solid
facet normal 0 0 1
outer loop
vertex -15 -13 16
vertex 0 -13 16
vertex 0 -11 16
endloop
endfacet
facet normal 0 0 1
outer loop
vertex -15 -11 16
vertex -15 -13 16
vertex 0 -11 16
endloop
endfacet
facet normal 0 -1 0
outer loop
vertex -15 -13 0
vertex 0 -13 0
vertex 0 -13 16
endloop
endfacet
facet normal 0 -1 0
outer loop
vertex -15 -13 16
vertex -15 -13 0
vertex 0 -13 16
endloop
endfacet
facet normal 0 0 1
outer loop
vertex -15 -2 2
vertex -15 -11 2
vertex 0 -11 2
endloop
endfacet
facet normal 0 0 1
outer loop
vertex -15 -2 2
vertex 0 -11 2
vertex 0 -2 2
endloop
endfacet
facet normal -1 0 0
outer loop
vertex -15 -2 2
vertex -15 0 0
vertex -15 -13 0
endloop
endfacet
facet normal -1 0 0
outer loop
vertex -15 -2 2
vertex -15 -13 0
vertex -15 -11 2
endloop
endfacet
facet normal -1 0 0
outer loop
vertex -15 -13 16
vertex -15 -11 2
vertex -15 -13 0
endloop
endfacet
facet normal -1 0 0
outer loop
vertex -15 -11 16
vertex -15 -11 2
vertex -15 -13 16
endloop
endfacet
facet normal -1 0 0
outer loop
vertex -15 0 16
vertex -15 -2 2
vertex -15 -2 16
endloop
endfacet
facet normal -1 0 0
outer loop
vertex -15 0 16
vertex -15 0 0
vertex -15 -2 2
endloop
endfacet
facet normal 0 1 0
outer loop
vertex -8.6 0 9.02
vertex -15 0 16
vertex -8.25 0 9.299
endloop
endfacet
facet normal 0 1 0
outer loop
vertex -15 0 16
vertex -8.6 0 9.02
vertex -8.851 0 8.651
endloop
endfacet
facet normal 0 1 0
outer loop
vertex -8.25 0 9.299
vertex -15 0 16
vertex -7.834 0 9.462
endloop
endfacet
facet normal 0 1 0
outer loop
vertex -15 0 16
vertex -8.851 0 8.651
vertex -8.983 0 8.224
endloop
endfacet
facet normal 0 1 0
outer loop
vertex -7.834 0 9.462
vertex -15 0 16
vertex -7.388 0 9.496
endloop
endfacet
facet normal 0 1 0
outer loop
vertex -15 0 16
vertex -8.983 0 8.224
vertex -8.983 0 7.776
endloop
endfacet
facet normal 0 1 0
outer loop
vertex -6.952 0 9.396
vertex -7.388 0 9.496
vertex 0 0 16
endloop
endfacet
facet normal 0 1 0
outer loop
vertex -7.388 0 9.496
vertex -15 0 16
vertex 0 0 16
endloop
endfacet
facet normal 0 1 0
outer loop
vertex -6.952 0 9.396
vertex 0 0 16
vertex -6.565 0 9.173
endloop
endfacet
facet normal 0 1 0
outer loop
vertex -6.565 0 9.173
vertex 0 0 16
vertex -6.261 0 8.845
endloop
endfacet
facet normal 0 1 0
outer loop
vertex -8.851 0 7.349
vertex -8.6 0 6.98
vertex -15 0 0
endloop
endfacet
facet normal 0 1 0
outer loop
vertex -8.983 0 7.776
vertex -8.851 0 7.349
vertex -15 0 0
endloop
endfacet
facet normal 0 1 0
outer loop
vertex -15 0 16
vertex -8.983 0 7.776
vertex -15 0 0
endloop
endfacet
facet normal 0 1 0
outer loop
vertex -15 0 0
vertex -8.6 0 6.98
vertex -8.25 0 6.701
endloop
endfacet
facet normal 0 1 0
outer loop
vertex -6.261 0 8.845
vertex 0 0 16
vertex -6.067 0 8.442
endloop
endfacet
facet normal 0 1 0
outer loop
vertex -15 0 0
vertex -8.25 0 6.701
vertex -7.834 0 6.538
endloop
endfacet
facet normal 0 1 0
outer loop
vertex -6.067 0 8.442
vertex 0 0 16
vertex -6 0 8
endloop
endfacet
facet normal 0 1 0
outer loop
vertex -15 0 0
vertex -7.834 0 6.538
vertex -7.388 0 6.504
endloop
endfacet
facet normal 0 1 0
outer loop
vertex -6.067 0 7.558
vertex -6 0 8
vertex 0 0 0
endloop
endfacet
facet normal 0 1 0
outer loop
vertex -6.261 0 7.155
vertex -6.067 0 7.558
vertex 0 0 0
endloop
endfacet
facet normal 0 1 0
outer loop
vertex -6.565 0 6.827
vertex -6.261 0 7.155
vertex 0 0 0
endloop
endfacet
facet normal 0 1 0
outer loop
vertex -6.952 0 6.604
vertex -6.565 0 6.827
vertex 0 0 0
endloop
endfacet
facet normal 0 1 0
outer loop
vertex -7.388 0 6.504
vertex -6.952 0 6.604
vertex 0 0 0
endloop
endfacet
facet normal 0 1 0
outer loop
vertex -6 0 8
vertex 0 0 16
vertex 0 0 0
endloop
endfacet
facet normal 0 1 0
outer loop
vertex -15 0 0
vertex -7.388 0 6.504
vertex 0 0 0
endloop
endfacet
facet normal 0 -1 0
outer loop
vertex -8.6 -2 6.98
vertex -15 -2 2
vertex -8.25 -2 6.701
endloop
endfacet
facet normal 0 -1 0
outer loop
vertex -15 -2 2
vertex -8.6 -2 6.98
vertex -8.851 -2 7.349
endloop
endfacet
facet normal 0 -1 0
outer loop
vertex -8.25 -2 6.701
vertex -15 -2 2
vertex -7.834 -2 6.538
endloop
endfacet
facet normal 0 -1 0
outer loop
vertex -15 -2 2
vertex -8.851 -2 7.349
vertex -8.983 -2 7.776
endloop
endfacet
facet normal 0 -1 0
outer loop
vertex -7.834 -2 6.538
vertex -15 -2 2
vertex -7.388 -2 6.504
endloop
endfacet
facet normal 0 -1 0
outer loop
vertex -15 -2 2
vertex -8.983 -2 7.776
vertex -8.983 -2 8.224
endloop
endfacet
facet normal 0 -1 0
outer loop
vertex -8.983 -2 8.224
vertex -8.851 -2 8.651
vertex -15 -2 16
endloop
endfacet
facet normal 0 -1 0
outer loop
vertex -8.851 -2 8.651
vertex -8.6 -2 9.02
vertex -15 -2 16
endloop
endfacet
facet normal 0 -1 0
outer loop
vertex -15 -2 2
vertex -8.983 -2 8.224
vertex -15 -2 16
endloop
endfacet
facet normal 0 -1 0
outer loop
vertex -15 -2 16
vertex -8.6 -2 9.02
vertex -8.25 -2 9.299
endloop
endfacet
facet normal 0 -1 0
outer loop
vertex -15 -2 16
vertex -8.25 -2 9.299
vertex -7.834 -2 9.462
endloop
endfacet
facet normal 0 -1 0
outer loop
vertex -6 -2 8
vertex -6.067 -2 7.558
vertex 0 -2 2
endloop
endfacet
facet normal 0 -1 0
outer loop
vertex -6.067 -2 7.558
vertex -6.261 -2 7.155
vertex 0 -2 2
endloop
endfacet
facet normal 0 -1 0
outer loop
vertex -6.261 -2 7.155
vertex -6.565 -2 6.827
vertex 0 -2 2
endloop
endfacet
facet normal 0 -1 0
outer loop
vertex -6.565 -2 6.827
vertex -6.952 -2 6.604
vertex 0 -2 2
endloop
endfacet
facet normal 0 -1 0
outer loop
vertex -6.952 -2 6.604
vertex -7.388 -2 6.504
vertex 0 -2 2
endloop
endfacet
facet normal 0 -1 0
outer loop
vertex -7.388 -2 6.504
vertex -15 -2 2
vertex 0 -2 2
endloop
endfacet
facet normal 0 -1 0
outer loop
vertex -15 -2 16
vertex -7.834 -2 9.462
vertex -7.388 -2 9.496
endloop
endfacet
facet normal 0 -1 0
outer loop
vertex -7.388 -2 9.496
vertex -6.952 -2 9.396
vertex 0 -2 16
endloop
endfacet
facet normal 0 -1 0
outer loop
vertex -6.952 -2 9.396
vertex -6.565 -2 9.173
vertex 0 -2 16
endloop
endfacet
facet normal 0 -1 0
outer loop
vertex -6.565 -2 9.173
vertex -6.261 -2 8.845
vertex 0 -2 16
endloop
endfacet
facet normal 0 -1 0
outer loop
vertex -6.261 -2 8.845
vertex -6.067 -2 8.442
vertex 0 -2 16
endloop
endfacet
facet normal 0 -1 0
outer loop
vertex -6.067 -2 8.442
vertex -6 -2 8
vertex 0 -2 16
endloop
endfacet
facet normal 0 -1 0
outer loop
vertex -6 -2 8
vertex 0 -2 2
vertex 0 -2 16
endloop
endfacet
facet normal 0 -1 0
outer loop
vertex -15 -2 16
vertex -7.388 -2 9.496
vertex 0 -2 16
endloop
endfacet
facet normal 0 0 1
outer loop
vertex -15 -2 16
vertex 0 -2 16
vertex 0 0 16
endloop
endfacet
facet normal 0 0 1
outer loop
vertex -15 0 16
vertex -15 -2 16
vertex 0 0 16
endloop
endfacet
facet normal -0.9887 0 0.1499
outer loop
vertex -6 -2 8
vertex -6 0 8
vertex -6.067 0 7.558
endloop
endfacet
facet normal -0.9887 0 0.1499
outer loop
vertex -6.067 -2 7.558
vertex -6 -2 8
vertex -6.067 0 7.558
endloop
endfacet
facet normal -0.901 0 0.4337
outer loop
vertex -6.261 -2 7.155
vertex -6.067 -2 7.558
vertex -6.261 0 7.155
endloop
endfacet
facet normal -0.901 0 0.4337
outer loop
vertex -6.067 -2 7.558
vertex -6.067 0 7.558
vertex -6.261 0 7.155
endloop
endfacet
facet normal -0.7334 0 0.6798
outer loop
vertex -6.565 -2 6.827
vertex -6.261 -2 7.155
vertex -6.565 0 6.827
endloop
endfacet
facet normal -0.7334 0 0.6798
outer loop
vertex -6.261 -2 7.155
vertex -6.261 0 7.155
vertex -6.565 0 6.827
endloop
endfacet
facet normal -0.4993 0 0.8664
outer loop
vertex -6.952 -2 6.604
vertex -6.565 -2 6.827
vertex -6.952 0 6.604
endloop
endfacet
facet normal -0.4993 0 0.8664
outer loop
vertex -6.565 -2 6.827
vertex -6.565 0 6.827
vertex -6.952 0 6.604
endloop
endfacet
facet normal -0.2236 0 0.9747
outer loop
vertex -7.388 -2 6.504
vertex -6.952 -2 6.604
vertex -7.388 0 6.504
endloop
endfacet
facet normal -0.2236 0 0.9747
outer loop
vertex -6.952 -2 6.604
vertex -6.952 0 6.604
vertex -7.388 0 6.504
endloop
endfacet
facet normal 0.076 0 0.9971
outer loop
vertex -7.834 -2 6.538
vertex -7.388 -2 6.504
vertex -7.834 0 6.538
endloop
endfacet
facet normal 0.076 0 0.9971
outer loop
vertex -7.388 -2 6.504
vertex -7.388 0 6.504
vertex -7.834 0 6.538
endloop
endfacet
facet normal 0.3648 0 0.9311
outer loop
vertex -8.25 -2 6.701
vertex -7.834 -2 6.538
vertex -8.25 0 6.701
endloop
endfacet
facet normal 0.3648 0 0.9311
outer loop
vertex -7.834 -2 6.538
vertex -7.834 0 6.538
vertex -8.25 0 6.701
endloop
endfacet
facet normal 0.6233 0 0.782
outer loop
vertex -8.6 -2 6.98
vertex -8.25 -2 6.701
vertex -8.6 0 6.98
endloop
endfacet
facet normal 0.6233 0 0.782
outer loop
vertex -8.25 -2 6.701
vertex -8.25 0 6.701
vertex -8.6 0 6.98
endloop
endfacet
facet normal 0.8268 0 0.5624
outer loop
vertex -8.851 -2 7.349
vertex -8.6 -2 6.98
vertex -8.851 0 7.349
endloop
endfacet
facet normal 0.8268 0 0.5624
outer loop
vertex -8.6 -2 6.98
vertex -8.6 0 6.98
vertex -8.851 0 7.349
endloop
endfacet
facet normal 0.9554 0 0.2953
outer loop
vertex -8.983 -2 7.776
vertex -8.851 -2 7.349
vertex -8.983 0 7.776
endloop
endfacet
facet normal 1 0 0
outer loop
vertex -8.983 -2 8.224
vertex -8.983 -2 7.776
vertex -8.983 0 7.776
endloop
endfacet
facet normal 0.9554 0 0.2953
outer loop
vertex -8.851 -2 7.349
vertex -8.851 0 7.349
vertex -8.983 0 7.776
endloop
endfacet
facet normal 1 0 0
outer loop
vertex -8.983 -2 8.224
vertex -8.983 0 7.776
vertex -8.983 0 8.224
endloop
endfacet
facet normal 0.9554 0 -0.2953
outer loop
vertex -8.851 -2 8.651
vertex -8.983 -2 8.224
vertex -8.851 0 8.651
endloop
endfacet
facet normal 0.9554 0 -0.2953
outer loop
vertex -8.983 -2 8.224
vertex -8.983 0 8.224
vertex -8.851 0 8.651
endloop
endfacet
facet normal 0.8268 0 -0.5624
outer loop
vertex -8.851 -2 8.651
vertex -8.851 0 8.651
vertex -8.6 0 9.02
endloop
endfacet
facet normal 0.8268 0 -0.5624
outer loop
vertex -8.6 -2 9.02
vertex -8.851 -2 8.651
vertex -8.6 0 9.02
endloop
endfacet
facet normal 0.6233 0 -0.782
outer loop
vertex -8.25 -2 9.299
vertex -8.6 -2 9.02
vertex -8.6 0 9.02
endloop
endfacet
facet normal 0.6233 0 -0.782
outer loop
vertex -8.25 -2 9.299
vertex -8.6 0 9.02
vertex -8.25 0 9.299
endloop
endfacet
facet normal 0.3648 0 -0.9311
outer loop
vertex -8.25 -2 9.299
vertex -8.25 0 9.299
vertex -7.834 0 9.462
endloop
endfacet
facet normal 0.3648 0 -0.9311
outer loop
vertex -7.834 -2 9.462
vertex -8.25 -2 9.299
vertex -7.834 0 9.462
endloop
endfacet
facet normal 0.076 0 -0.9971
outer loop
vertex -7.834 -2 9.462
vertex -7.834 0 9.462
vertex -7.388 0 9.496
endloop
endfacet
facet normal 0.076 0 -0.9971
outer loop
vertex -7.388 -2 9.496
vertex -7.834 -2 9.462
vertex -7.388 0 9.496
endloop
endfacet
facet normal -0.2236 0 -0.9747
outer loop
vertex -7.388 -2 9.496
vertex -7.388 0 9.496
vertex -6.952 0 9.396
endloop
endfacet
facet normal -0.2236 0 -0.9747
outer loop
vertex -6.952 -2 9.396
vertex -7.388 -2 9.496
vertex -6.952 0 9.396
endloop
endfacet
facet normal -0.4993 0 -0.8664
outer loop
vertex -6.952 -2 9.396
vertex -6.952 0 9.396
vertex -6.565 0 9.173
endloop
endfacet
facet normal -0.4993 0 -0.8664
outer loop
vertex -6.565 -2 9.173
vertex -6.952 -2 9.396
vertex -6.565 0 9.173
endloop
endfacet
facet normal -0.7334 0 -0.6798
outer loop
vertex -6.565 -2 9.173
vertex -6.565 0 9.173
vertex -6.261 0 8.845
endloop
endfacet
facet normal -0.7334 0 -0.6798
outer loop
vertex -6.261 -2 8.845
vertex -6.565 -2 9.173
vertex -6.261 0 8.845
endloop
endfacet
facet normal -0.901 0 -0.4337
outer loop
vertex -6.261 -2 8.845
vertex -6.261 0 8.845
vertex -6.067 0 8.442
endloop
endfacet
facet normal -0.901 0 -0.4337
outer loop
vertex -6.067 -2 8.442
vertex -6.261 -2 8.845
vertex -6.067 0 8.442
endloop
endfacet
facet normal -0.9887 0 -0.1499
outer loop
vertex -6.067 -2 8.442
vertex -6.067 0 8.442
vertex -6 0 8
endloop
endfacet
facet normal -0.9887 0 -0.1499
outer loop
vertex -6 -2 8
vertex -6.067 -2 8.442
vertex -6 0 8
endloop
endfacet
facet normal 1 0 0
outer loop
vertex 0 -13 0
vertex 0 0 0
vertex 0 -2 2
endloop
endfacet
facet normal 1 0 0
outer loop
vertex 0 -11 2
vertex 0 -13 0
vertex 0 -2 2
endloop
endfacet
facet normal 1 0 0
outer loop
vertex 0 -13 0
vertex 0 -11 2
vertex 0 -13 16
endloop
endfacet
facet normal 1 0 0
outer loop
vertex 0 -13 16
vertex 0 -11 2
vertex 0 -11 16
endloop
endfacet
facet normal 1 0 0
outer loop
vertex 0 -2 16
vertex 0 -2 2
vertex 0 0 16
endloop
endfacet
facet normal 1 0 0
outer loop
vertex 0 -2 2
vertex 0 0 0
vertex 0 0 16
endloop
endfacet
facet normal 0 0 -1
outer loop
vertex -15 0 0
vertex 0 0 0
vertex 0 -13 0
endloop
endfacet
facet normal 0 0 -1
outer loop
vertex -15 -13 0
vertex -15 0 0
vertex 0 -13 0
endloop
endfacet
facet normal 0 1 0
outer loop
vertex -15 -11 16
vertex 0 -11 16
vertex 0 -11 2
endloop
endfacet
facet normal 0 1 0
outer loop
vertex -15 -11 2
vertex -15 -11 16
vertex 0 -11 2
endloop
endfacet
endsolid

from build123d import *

# Parameters (mm, degrees)
BOSS_EXTRUDE1_DEPTH = 15
CUT_EXTRUDE1_REACH  = 15
SKETCH2_R           = 1.5


with BuildPart() as part:
    # Sketch1 → Boss-Extrude1 (new body)
    with BuildSketch(Plane(origin=(0, 0, 0), x_dir=(0, 0, -1), z_dir=(1, 0, 0))):
        Polygon((0, 0), (0, -13), (-16, -13), (-16, -11), (-2, -11), (-2, -2), (-16, -2), (-16, 0), align=None)
    extrude(amount=-BOSS_EXTRUDE1_DEPTH)

    # Sketch2 → Cut-Extrude1 (cut, up to next)
    with BuildSketch(Plane(origin=(0, 0, 0), x_dir=(1, 0, 0), z_dir=(0, 1, 0)), mode=Mode.PRIVATE) as cut_extrude1_sk1:
        with Locations((-7.5, -8)):
            Circle(SKETCH2_R)
    cut_extrude1_tool1 = extrude(cut_extrude1_sk1.sketch, amount=-CUT_EXTRUDE1_REACH, mode=Mode.PRIVATE) & part.part
    add(cut_extrude1_tool1.solids().sort_by_distance((-7.5, 0, 8))[0], mode=Mode.SUBTRACT)


solid = part.part
